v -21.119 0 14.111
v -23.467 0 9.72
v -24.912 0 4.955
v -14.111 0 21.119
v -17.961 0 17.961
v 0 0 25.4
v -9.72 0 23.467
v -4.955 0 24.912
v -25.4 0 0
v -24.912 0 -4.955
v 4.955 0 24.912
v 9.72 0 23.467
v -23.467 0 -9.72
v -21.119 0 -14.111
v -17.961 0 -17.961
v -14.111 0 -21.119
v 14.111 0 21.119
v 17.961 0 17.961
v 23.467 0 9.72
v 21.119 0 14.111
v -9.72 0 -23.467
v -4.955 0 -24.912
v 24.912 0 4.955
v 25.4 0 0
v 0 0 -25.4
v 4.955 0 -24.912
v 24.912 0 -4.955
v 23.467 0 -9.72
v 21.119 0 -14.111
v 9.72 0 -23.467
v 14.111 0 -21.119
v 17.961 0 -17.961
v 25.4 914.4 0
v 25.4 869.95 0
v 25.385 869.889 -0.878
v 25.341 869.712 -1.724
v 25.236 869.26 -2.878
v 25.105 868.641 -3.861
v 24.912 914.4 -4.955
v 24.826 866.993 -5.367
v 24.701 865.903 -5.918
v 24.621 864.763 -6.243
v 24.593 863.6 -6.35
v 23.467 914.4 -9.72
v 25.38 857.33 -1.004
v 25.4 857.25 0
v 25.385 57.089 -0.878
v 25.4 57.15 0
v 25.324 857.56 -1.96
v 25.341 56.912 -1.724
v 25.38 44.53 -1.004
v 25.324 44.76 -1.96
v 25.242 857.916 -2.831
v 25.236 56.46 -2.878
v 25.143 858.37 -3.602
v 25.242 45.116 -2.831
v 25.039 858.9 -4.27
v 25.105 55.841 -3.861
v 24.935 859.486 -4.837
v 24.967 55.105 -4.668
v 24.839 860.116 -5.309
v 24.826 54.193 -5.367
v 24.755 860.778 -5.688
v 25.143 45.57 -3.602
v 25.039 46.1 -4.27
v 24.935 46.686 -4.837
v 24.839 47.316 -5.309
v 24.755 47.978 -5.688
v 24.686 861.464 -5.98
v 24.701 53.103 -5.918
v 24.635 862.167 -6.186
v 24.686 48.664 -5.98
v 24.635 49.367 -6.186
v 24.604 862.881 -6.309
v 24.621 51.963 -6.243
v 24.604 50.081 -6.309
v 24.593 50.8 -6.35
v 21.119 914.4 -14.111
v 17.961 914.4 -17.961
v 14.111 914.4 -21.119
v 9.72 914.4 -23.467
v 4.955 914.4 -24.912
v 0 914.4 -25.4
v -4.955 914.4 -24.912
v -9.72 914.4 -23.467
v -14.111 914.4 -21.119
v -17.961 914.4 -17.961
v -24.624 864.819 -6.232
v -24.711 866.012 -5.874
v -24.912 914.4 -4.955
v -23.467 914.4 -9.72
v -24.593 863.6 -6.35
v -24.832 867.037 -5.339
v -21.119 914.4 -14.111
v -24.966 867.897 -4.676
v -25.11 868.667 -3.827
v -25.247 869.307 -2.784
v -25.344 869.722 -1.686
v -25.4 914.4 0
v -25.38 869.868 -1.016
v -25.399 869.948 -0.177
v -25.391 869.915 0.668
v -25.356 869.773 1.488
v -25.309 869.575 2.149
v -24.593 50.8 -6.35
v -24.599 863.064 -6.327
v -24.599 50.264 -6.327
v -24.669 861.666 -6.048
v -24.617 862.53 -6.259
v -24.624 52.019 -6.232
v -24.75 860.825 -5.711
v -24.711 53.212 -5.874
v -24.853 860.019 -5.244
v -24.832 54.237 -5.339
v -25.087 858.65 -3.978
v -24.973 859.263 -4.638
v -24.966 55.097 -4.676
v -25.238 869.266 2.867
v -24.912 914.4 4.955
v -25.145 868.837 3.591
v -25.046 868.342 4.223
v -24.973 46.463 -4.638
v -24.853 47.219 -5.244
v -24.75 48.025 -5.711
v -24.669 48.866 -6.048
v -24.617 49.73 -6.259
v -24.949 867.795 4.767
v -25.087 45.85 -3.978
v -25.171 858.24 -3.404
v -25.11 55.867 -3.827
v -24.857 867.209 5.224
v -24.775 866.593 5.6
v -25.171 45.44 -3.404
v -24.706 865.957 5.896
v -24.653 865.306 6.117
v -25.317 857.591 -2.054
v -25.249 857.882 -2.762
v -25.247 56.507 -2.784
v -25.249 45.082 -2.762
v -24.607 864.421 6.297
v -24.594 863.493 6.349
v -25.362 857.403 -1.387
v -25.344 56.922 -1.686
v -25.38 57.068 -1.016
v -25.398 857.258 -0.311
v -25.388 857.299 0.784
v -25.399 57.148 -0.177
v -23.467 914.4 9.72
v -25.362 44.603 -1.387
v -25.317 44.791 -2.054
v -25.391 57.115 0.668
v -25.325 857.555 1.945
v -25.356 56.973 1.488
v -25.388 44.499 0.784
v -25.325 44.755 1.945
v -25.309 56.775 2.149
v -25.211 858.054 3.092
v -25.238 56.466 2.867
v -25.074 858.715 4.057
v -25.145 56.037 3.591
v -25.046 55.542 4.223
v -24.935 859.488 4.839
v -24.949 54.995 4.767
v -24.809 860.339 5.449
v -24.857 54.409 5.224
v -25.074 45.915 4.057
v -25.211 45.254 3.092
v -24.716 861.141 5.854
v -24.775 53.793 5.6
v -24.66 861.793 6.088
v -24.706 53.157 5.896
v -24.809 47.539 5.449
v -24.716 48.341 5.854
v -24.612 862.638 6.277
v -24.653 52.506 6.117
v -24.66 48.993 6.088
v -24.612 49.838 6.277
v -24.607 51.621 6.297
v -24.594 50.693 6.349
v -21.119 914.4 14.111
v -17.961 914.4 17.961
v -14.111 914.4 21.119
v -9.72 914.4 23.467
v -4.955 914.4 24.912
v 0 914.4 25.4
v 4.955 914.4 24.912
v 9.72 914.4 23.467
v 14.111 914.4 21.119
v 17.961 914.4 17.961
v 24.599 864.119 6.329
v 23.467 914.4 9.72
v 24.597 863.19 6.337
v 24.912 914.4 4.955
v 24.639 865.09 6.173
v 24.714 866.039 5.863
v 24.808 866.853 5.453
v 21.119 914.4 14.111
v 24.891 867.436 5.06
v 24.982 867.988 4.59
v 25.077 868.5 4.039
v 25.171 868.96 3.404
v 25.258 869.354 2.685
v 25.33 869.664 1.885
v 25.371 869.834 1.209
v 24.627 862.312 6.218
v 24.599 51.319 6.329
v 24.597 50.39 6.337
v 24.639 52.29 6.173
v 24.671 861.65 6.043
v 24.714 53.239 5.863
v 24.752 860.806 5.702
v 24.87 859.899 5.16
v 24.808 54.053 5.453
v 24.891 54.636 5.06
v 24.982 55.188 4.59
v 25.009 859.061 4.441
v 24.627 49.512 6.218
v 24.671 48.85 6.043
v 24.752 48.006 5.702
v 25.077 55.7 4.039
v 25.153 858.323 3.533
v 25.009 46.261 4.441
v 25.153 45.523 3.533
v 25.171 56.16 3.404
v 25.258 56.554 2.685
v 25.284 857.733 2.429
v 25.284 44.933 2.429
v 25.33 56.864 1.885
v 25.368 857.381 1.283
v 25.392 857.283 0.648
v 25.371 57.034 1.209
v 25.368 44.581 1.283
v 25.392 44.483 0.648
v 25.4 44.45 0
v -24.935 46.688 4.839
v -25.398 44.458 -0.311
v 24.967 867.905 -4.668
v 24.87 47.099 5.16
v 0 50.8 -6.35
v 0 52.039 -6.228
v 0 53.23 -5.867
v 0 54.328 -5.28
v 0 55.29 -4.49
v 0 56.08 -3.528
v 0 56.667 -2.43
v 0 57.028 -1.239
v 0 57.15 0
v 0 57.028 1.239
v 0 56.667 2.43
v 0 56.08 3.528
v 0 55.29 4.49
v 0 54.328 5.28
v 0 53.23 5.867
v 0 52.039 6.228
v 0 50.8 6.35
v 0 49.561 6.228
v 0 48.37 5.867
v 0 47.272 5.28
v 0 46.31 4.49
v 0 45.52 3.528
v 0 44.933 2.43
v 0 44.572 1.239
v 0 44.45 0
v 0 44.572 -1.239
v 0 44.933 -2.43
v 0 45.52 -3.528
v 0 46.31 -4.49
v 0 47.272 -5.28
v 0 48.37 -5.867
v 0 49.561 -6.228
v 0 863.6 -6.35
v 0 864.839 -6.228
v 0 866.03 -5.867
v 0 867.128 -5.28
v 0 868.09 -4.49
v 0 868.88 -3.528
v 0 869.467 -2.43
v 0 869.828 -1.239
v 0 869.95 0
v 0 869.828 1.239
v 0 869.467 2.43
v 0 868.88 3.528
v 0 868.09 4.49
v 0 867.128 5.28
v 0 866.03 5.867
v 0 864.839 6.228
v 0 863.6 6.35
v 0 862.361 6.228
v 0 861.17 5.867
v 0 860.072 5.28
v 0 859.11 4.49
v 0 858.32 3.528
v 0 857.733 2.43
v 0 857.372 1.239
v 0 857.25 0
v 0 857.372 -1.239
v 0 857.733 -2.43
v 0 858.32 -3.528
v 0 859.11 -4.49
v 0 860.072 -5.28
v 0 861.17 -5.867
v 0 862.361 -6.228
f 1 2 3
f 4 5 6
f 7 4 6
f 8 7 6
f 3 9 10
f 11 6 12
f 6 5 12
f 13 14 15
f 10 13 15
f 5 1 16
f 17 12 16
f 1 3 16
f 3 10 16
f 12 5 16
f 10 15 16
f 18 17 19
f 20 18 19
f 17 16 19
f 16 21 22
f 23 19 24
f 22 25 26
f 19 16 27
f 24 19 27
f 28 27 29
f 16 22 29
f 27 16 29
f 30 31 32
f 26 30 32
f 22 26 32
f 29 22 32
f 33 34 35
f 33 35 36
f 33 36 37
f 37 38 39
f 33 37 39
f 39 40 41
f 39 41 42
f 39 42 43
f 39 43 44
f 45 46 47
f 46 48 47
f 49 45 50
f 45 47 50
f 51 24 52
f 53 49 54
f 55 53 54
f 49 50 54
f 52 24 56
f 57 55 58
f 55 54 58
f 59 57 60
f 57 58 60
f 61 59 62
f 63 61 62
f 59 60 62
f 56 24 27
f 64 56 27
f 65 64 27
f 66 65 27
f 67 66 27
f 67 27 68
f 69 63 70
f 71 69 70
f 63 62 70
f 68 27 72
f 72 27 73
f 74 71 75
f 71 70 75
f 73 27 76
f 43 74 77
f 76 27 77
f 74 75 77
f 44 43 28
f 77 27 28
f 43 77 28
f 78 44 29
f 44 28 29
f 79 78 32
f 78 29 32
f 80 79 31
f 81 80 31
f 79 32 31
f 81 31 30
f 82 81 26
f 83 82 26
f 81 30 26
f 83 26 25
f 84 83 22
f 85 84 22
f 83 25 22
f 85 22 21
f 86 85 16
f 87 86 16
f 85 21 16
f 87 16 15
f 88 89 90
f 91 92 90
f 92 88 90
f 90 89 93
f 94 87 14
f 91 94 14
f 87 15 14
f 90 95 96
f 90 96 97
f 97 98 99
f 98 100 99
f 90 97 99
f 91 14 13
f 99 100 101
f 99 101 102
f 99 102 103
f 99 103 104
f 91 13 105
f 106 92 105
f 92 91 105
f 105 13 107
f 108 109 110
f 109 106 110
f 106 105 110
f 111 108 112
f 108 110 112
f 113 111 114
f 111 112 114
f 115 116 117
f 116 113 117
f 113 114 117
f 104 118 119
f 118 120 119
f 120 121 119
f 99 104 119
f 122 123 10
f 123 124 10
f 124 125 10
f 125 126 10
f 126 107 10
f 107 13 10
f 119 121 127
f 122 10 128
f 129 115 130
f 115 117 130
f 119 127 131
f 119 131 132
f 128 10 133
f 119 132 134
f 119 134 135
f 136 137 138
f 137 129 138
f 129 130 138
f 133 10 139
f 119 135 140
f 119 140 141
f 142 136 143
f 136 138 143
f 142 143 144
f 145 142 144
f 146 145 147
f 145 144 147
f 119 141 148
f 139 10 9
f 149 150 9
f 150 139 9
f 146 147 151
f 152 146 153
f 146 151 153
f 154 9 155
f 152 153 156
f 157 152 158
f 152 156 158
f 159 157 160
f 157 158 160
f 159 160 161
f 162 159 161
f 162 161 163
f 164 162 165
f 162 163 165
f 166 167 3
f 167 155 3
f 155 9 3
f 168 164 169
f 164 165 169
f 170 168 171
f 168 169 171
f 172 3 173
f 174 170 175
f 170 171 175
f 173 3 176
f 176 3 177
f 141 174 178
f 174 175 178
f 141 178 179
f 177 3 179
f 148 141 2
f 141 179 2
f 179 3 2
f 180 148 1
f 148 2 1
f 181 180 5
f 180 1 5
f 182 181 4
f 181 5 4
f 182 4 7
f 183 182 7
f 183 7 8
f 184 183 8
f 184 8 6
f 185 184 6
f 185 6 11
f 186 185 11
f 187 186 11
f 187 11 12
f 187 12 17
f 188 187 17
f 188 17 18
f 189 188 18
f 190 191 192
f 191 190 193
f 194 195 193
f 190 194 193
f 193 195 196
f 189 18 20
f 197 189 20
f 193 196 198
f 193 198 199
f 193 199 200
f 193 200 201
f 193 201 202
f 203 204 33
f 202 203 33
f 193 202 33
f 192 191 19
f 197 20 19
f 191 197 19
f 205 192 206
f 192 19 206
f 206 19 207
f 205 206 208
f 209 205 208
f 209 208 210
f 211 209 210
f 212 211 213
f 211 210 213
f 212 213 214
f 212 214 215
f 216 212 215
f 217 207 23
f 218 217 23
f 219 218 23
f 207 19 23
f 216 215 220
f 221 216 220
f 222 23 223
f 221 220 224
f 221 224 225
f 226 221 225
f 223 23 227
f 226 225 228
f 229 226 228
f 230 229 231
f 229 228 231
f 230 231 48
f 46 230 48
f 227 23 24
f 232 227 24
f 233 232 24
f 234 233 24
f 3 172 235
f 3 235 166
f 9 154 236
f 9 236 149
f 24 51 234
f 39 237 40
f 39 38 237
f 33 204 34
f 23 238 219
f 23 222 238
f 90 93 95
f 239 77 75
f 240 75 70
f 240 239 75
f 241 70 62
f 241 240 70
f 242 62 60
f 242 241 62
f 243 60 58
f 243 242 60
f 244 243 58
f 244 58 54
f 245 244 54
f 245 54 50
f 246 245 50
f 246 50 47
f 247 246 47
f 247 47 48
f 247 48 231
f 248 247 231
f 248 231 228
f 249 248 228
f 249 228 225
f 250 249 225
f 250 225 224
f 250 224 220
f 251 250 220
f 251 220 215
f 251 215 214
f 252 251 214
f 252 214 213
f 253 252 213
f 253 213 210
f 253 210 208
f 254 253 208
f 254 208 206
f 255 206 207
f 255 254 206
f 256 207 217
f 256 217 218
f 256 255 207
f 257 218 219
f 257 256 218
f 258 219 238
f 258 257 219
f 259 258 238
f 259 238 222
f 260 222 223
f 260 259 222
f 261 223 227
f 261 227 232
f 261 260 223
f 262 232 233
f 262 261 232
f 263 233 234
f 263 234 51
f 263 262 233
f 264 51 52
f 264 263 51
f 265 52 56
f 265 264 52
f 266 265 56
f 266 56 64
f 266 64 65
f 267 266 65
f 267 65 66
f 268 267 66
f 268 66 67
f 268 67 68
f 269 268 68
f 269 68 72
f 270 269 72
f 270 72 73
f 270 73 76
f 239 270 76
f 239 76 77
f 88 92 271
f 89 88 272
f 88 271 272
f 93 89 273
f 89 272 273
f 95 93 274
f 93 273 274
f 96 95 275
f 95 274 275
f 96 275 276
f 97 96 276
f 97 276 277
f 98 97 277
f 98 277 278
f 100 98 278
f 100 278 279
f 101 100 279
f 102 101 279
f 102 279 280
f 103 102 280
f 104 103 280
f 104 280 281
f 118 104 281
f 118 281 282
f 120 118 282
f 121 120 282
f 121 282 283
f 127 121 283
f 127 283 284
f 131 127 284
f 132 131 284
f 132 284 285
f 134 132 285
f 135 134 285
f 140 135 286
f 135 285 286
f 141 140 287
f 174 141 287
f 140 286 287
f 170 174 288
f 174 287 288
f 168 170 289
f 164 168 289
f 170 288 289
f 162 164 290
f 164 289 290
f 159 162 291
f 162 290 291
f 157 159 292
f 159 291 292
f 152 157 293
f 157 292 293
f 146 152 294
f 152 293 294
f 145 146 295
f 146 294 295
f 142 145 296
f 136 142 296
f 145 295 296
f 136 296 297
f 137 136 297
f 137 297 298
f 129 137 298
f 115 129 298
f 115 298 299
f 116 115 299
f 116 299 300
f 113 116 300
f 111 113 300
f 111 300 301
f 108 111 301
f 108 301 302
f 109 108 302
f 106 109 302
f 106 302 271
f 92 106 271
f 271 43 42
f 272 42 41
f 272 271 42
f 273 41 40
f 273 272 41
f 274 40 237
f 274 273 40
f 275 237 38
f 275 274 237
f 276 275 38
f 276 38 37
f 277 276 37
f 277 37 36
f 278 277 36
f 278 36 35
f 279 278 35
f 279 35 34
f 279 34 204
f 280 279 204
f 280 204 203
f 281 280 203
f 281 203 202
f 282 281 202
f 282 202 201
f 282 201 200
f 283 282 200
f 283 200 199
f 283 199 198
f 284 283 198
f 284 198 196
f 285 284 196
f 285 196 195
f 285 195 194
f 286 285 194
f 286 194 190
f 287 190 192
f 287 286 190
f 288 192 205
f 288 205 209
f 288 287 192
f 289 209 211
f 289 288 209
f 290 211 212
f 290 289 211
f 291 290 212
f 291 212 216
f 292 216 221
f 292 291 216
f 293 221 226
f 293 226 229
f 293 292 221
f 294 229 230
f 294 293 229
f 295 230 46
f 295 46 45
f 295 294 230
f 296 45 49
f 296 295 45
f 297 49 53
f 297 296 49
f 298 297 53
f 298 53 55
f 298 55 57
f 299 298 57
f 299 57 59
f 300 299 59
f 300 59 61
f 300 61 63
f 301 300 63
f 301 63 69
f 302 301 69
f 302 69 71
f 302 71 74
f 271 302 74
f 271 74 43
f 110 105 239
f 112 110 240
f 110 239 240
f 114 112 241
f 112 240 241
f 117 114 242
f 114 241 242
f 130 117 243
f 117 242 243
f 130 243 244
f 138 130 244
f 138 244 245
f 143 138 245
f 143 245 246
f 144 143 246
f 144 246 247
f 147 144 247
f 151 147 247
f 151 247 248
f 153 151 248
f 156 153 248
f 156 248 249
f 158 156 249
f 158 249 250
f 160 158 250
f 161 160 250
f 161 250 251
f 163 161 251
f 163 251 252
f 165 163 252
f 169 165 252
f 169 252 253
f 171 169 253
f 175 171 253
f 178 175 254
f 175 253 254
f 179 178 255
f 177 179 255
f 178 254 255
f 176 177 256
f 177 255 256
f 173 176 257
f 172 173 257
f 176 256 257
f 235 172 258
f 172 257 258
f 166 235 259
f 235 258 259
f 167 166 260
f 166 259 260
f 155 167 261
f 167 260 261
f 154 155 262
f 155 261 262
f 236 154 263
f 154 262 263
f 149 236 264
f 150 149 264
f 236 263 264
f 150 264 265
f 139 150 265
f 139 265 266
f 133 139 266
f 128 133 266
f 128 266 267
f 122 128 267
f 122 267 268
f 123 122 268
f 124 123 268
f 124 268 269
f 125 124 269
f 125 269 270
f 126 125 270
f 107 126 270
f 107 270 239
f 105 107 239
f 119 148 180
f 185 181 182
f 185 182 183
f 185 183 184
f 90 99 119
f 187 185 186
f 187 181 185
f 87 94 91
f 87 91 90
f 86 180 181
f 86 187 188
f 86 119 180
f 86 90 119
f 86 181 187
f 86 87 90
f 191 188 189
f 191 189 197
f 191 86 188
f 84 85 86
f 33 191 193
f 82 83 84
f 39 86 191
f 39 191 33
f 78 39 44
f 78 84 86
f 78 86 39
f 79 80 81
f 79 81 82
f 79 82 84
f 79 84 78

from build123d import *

# Parameters (mm, degrees)
SKETCH1_R               = 25.4
BOSS_EXTRUDE1_DEPTH     = 914.4
SKETCH2_R               = 6.35
CUT_EXTRUDE3_DEPTH      = 26.4
CUT_EXTRUDE3_DEPTH_BACK = 26.4


with BuildPart() as part:
    # Sketch1 → Boss-Extrude1 (new body)
    with BuildSketch(Plane(origin=(0, 0, 0), x_dir=(1, 0, 0), z_dir=(0, 1, 0))):
        Circle(SKETCH1_R)
    extrude(amount=BOSS_EXTRUDE1_DEPTH)

    # Sketch2 → Cut-Extrude3 (cut, two sides)
    with BuildSketch(Plane(origin=(0, 0, 0), x_dir=(0, 0, -1), z_dir=(1, 0, 0))) as cut_extrude3_sk:
        with Locations((0, 863.6)):
            Circle(SKETCH2_R)
        with Locations((0, 50.8)):
            Circle(SKETCH2_R)
    extrude(amount=CUT_EXTRUDE3_DEPTH, mode=Mode.SUBTRACT)
    extrude(cut_extrude3_sk.sketch, amount=-CUT_EXTRUDE3_DEPTH_BACK, mode=Mode.SUBTRACT)


solid = part.part
